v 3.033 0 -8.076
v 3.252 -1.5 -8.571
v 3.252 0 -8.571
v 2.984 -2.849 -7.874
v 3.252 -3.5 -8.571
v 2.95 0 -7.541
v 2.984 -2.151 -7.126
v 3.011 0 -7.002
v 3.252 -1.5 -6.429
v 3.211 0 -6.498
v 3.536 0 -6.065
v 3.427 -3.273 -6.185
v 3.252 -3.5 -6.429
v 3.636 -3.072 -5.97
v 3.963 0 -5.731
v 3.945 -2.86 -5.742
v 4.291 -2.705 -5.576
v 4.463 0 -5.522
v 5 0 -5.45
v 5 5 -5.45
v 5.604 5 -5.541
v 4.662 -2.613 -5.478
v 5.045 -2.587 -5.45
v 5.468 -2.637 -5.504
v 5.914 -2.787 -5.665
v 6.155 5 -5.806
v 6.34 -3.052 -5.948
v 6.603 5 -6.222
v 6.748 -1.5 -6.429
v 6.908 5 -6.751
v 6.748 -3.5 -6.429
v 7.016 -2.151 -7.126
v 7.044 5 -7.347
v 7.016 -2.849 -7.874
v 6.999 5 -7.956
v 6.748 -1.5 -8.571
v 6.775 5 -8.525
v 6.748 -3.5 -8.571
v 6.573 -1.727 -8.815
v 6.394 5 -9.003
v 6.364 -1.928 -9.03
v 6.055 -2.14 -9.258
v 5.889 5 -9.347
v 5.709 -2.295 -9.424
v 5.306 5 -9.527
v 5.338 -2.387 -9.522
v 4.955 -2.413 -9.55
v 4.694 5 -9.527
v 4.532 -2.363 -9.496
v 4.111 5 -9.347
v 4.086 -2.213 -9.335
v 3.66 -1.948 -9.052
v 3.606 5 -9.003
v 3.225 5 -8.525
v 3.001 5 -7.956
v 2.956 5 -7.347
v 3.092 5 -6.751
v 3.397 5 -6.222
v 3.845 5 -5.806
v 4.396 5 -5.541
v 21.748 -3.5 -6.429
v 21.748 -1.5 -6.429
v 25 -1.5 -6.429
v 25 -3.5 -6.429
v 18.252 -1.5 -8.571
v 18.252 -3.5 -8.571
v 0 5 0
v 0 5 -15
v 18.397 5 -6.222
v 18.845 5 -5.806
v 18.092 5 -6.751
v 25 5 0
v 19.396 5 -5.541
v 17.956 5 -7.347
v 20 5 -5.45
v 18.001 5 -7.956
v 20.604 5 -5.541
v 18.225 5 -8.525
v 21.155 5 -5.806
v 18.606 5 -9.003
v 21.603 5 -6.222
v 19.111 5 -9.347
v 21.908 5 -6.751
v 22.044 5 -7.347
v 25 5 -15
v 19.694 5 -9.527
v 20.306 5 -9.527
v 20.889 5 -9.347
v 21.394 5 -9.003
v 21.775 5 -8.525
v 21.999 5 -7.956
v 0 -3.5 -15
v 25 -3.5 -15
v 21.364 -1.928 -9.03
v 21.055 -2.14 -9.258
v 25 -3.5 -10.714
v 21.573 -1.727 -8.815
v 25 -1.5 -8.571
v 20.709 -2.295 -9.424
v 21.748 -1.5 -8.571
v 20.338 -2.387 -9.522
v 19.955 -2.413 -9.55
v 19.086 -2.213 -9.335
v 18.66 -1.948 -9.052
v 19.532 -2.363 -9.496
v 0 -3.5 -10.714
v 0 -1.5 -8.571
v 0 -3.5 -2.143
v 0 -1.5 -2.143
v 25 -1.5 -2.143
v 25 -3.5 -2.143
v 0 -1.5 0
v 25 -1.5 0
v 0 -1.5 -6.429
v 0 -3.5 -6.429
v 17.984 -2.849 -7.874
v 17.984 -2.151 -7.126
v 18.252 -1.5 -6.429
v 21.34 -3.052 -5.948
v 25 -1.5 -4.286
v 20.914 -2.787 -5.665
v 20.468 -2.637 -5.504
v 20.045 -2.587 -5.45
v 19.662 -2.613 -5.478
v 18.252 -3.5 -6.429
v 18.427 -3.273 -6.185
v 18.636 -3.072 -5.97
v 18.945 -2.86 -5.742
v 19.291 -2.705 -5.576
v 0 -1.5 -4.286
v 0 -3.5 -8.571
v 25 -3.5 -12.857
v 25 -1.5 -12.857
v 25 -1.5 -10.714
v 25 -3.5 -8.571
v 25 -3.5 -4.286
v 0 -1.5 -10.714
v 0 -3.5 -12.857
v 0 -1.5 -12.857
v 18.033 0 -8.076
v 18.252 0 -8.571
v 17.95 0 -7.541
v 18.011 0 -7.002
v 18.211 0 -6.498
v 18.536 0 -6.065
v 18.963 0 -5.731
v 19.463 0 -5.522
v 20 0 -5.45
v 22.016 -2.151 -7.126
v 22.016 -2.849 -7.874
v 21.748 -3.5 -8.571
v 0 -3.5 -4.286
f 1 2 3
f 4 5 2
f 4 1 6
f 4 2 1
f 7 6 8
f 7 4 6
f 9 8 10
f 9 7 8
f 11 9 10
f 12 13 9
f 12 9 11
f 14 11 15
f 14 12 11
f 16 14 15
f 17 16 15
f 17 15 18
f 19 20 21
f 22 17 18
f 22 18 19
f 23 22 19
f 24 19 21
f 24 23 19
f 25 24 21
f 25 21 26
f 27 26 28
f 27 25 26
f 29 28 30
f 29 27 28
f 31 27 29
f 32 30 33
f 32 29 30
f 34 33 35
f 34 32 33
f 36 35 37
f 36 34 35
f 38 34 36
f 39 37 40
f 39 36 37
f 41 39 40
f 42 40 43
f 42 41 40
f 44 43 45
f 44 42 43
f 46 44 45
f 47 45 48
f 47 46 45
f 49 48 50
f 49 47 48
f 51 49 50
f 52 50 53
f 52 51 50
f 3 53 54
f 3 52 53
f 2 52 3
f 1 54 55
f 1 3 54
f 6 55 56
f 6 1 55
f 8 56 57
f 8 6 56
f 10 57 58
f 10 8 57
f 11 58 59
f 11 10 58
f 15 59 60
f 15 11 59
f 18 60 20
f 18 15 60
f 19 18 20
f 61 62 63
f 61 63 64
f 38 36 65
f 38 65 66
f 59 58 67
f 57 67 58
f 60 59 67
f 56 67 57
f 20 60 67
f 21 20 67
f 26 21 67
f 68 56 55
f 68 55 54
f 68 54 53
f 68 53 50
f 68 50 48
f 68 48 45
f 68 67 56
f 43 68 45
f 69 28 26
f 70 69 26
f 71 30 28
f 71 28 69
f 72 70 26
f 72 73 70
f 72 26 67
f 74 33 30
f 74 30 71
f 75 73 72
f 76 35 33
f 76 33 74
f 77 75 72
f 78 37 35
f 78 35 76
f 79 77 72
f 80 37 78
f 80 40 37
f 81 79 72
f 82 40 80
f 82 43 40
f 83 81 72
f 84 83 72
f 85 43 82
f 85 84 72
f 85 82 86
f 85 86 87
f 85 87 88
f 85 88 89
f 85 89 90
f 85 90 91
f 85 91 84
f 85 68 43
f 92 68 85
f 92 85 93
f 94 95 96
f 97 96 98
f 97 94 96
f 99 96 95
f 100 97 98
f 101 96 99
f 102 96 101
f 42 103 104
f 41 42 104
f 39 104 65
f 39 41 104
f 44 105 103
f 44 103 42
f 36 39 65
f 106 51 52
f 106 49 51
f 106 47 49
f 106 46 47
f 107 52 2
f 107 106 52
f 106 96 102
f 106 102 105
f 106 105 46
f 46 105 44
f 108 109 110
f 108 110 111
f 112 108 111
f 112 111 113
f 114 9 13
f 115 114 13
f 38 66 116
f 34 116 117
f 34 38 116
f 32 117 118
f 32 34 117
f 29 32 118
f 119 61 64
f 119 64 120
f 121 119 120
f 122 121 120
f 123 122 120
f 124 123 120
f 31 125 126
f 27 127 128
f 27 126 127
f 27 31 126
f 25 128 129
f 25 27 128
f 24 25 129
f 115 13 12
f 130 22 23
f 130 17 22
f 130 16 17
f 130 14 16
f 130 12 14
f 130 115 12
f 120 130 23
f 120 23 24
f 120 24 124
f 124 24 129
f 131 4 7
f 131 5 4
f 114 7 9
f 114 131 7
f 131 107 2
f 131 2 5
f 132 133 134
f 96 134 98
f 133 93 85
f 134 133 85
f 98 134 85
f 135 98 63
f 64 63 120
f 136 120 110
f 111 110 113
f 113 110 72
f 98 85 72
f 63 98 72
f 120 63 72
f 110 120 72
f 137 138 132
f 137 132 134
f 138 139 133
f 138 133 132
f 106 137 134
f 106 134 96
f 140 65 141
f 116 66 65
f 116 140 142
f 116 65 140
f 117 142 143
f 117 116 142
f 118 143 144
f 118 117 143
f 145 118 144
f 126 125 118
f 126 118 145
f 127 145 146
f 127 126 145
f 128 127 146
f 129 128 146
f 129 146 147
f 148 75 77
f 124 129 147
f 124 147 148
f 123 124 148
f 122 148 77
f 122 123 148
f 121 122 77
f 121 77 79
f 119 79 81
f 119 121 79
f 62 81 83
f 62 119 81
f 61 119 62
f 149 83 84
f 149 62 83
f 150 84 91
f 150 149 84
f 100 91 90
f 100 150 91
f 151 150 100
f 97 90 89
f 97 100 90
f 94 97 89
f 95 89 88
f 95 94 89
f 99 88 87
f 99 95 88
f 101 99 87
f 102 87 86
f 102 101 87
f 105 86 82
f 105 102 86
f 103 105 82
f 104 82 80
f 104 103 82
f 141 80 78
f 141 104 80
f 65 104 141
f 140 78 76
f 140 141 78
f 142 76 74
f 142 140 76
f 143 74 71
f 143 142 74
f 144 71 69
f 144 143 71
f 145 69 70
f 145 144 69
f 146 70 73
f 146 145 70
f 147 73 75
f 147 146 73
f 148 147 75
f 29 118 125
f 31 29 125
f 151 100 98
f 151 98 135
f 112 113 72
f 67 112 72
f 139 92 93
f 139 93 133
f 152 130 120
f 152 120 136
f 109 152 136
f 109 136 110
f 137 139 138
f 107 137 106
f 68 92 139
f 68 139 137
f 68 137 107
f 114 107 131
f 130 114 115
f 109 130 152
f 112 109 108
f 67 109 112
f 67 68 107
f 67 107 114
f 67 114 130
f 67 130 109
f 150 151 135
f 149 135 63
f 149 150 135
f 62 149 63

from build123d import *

# Parameters (mm, degrees)
CROQUIS1_W              = 25
CROQUIS1_H              = 15
CROQUIS1_R              = 2.05
SALIENTE_EXTRUIR1_DEPTH = 5
SALIENTE_EXTRUIR2_DEPTH = 25
CORTAR_EXTRUIR1_START   = -29
CROQUIS3_R              = 2.05
CORTAR_EXTRUIR1_DEPTH   = 29


with BuildPart() as part:
    # Croquis1 → Saliente-Extruir1 (new body)
    with BuildSketch(Plane(origin=(0, 0, 0), x_dir=(1, 0, 0), z_dir=(0, 1, 0))):
        with Locations((12.5, 7.5)):
            Rectangle(CROQUIS1_W, CROQUIS1_H)
        with Locations(Location((5, 7.5, 0), (0, 0, 270))):
            Circle(CROQUIS1_R, mode=Mode.SUBTRACT)
        with Locations(Location((20, 7.5, 0), (0, 0, 270))):
            Circle(CROQUIS1_R, mode=Mode.SUBTRACT)
    extrude(amount=SALIENTE_EXTRUIR1_DEPTH)

    # Croquis2 → Saliente-Extruir2 (add)
    with BuildSketch(Plane.ZY):
        Polygon((-15, 0), (-15, -3.5), (-12.857142857, -1.5), (-12.857142857, -3.5), (-10.714285714, -1.5), (-10.714285714, -3.5), (-8.571428571, -1.5), (-8.571428571, -3.5), (-6.428571429, -1.5), (-6.428571429, -3.5), (-4.285714286, -1.5), (-4.285714286, -3.5), (-2.142857143, -1.5), (-2.142857143, -3.5), (0, -1.5), (0, 0), align=None)
    extrude(amount=-SALIENTE_EXTRUIR2_DEPTH)

    # Croquis3 → Cortar-Extruir1 (cut)
    with BuildSketch(Plane(origin=(0, 5, 0), x_dir=(1, 0, 0), z_dir=(0, 1, 0)).offset(CORTAR_EXTRUIR1_START)):
        with Locations(Location((5, 7.5, 0), (0, 0, 148.489952077))):
            Circle(CROQUIS3_R)
        with Locations(Location((20, 7.5, 0), (0, 0, 148.489952077))):
            Circle(CROQUIS3_R)
    extrude(amount=CORTAR_EXTRUIR1_DEPTH, mode=Mode.SUBTRACT)


solid = part.part
